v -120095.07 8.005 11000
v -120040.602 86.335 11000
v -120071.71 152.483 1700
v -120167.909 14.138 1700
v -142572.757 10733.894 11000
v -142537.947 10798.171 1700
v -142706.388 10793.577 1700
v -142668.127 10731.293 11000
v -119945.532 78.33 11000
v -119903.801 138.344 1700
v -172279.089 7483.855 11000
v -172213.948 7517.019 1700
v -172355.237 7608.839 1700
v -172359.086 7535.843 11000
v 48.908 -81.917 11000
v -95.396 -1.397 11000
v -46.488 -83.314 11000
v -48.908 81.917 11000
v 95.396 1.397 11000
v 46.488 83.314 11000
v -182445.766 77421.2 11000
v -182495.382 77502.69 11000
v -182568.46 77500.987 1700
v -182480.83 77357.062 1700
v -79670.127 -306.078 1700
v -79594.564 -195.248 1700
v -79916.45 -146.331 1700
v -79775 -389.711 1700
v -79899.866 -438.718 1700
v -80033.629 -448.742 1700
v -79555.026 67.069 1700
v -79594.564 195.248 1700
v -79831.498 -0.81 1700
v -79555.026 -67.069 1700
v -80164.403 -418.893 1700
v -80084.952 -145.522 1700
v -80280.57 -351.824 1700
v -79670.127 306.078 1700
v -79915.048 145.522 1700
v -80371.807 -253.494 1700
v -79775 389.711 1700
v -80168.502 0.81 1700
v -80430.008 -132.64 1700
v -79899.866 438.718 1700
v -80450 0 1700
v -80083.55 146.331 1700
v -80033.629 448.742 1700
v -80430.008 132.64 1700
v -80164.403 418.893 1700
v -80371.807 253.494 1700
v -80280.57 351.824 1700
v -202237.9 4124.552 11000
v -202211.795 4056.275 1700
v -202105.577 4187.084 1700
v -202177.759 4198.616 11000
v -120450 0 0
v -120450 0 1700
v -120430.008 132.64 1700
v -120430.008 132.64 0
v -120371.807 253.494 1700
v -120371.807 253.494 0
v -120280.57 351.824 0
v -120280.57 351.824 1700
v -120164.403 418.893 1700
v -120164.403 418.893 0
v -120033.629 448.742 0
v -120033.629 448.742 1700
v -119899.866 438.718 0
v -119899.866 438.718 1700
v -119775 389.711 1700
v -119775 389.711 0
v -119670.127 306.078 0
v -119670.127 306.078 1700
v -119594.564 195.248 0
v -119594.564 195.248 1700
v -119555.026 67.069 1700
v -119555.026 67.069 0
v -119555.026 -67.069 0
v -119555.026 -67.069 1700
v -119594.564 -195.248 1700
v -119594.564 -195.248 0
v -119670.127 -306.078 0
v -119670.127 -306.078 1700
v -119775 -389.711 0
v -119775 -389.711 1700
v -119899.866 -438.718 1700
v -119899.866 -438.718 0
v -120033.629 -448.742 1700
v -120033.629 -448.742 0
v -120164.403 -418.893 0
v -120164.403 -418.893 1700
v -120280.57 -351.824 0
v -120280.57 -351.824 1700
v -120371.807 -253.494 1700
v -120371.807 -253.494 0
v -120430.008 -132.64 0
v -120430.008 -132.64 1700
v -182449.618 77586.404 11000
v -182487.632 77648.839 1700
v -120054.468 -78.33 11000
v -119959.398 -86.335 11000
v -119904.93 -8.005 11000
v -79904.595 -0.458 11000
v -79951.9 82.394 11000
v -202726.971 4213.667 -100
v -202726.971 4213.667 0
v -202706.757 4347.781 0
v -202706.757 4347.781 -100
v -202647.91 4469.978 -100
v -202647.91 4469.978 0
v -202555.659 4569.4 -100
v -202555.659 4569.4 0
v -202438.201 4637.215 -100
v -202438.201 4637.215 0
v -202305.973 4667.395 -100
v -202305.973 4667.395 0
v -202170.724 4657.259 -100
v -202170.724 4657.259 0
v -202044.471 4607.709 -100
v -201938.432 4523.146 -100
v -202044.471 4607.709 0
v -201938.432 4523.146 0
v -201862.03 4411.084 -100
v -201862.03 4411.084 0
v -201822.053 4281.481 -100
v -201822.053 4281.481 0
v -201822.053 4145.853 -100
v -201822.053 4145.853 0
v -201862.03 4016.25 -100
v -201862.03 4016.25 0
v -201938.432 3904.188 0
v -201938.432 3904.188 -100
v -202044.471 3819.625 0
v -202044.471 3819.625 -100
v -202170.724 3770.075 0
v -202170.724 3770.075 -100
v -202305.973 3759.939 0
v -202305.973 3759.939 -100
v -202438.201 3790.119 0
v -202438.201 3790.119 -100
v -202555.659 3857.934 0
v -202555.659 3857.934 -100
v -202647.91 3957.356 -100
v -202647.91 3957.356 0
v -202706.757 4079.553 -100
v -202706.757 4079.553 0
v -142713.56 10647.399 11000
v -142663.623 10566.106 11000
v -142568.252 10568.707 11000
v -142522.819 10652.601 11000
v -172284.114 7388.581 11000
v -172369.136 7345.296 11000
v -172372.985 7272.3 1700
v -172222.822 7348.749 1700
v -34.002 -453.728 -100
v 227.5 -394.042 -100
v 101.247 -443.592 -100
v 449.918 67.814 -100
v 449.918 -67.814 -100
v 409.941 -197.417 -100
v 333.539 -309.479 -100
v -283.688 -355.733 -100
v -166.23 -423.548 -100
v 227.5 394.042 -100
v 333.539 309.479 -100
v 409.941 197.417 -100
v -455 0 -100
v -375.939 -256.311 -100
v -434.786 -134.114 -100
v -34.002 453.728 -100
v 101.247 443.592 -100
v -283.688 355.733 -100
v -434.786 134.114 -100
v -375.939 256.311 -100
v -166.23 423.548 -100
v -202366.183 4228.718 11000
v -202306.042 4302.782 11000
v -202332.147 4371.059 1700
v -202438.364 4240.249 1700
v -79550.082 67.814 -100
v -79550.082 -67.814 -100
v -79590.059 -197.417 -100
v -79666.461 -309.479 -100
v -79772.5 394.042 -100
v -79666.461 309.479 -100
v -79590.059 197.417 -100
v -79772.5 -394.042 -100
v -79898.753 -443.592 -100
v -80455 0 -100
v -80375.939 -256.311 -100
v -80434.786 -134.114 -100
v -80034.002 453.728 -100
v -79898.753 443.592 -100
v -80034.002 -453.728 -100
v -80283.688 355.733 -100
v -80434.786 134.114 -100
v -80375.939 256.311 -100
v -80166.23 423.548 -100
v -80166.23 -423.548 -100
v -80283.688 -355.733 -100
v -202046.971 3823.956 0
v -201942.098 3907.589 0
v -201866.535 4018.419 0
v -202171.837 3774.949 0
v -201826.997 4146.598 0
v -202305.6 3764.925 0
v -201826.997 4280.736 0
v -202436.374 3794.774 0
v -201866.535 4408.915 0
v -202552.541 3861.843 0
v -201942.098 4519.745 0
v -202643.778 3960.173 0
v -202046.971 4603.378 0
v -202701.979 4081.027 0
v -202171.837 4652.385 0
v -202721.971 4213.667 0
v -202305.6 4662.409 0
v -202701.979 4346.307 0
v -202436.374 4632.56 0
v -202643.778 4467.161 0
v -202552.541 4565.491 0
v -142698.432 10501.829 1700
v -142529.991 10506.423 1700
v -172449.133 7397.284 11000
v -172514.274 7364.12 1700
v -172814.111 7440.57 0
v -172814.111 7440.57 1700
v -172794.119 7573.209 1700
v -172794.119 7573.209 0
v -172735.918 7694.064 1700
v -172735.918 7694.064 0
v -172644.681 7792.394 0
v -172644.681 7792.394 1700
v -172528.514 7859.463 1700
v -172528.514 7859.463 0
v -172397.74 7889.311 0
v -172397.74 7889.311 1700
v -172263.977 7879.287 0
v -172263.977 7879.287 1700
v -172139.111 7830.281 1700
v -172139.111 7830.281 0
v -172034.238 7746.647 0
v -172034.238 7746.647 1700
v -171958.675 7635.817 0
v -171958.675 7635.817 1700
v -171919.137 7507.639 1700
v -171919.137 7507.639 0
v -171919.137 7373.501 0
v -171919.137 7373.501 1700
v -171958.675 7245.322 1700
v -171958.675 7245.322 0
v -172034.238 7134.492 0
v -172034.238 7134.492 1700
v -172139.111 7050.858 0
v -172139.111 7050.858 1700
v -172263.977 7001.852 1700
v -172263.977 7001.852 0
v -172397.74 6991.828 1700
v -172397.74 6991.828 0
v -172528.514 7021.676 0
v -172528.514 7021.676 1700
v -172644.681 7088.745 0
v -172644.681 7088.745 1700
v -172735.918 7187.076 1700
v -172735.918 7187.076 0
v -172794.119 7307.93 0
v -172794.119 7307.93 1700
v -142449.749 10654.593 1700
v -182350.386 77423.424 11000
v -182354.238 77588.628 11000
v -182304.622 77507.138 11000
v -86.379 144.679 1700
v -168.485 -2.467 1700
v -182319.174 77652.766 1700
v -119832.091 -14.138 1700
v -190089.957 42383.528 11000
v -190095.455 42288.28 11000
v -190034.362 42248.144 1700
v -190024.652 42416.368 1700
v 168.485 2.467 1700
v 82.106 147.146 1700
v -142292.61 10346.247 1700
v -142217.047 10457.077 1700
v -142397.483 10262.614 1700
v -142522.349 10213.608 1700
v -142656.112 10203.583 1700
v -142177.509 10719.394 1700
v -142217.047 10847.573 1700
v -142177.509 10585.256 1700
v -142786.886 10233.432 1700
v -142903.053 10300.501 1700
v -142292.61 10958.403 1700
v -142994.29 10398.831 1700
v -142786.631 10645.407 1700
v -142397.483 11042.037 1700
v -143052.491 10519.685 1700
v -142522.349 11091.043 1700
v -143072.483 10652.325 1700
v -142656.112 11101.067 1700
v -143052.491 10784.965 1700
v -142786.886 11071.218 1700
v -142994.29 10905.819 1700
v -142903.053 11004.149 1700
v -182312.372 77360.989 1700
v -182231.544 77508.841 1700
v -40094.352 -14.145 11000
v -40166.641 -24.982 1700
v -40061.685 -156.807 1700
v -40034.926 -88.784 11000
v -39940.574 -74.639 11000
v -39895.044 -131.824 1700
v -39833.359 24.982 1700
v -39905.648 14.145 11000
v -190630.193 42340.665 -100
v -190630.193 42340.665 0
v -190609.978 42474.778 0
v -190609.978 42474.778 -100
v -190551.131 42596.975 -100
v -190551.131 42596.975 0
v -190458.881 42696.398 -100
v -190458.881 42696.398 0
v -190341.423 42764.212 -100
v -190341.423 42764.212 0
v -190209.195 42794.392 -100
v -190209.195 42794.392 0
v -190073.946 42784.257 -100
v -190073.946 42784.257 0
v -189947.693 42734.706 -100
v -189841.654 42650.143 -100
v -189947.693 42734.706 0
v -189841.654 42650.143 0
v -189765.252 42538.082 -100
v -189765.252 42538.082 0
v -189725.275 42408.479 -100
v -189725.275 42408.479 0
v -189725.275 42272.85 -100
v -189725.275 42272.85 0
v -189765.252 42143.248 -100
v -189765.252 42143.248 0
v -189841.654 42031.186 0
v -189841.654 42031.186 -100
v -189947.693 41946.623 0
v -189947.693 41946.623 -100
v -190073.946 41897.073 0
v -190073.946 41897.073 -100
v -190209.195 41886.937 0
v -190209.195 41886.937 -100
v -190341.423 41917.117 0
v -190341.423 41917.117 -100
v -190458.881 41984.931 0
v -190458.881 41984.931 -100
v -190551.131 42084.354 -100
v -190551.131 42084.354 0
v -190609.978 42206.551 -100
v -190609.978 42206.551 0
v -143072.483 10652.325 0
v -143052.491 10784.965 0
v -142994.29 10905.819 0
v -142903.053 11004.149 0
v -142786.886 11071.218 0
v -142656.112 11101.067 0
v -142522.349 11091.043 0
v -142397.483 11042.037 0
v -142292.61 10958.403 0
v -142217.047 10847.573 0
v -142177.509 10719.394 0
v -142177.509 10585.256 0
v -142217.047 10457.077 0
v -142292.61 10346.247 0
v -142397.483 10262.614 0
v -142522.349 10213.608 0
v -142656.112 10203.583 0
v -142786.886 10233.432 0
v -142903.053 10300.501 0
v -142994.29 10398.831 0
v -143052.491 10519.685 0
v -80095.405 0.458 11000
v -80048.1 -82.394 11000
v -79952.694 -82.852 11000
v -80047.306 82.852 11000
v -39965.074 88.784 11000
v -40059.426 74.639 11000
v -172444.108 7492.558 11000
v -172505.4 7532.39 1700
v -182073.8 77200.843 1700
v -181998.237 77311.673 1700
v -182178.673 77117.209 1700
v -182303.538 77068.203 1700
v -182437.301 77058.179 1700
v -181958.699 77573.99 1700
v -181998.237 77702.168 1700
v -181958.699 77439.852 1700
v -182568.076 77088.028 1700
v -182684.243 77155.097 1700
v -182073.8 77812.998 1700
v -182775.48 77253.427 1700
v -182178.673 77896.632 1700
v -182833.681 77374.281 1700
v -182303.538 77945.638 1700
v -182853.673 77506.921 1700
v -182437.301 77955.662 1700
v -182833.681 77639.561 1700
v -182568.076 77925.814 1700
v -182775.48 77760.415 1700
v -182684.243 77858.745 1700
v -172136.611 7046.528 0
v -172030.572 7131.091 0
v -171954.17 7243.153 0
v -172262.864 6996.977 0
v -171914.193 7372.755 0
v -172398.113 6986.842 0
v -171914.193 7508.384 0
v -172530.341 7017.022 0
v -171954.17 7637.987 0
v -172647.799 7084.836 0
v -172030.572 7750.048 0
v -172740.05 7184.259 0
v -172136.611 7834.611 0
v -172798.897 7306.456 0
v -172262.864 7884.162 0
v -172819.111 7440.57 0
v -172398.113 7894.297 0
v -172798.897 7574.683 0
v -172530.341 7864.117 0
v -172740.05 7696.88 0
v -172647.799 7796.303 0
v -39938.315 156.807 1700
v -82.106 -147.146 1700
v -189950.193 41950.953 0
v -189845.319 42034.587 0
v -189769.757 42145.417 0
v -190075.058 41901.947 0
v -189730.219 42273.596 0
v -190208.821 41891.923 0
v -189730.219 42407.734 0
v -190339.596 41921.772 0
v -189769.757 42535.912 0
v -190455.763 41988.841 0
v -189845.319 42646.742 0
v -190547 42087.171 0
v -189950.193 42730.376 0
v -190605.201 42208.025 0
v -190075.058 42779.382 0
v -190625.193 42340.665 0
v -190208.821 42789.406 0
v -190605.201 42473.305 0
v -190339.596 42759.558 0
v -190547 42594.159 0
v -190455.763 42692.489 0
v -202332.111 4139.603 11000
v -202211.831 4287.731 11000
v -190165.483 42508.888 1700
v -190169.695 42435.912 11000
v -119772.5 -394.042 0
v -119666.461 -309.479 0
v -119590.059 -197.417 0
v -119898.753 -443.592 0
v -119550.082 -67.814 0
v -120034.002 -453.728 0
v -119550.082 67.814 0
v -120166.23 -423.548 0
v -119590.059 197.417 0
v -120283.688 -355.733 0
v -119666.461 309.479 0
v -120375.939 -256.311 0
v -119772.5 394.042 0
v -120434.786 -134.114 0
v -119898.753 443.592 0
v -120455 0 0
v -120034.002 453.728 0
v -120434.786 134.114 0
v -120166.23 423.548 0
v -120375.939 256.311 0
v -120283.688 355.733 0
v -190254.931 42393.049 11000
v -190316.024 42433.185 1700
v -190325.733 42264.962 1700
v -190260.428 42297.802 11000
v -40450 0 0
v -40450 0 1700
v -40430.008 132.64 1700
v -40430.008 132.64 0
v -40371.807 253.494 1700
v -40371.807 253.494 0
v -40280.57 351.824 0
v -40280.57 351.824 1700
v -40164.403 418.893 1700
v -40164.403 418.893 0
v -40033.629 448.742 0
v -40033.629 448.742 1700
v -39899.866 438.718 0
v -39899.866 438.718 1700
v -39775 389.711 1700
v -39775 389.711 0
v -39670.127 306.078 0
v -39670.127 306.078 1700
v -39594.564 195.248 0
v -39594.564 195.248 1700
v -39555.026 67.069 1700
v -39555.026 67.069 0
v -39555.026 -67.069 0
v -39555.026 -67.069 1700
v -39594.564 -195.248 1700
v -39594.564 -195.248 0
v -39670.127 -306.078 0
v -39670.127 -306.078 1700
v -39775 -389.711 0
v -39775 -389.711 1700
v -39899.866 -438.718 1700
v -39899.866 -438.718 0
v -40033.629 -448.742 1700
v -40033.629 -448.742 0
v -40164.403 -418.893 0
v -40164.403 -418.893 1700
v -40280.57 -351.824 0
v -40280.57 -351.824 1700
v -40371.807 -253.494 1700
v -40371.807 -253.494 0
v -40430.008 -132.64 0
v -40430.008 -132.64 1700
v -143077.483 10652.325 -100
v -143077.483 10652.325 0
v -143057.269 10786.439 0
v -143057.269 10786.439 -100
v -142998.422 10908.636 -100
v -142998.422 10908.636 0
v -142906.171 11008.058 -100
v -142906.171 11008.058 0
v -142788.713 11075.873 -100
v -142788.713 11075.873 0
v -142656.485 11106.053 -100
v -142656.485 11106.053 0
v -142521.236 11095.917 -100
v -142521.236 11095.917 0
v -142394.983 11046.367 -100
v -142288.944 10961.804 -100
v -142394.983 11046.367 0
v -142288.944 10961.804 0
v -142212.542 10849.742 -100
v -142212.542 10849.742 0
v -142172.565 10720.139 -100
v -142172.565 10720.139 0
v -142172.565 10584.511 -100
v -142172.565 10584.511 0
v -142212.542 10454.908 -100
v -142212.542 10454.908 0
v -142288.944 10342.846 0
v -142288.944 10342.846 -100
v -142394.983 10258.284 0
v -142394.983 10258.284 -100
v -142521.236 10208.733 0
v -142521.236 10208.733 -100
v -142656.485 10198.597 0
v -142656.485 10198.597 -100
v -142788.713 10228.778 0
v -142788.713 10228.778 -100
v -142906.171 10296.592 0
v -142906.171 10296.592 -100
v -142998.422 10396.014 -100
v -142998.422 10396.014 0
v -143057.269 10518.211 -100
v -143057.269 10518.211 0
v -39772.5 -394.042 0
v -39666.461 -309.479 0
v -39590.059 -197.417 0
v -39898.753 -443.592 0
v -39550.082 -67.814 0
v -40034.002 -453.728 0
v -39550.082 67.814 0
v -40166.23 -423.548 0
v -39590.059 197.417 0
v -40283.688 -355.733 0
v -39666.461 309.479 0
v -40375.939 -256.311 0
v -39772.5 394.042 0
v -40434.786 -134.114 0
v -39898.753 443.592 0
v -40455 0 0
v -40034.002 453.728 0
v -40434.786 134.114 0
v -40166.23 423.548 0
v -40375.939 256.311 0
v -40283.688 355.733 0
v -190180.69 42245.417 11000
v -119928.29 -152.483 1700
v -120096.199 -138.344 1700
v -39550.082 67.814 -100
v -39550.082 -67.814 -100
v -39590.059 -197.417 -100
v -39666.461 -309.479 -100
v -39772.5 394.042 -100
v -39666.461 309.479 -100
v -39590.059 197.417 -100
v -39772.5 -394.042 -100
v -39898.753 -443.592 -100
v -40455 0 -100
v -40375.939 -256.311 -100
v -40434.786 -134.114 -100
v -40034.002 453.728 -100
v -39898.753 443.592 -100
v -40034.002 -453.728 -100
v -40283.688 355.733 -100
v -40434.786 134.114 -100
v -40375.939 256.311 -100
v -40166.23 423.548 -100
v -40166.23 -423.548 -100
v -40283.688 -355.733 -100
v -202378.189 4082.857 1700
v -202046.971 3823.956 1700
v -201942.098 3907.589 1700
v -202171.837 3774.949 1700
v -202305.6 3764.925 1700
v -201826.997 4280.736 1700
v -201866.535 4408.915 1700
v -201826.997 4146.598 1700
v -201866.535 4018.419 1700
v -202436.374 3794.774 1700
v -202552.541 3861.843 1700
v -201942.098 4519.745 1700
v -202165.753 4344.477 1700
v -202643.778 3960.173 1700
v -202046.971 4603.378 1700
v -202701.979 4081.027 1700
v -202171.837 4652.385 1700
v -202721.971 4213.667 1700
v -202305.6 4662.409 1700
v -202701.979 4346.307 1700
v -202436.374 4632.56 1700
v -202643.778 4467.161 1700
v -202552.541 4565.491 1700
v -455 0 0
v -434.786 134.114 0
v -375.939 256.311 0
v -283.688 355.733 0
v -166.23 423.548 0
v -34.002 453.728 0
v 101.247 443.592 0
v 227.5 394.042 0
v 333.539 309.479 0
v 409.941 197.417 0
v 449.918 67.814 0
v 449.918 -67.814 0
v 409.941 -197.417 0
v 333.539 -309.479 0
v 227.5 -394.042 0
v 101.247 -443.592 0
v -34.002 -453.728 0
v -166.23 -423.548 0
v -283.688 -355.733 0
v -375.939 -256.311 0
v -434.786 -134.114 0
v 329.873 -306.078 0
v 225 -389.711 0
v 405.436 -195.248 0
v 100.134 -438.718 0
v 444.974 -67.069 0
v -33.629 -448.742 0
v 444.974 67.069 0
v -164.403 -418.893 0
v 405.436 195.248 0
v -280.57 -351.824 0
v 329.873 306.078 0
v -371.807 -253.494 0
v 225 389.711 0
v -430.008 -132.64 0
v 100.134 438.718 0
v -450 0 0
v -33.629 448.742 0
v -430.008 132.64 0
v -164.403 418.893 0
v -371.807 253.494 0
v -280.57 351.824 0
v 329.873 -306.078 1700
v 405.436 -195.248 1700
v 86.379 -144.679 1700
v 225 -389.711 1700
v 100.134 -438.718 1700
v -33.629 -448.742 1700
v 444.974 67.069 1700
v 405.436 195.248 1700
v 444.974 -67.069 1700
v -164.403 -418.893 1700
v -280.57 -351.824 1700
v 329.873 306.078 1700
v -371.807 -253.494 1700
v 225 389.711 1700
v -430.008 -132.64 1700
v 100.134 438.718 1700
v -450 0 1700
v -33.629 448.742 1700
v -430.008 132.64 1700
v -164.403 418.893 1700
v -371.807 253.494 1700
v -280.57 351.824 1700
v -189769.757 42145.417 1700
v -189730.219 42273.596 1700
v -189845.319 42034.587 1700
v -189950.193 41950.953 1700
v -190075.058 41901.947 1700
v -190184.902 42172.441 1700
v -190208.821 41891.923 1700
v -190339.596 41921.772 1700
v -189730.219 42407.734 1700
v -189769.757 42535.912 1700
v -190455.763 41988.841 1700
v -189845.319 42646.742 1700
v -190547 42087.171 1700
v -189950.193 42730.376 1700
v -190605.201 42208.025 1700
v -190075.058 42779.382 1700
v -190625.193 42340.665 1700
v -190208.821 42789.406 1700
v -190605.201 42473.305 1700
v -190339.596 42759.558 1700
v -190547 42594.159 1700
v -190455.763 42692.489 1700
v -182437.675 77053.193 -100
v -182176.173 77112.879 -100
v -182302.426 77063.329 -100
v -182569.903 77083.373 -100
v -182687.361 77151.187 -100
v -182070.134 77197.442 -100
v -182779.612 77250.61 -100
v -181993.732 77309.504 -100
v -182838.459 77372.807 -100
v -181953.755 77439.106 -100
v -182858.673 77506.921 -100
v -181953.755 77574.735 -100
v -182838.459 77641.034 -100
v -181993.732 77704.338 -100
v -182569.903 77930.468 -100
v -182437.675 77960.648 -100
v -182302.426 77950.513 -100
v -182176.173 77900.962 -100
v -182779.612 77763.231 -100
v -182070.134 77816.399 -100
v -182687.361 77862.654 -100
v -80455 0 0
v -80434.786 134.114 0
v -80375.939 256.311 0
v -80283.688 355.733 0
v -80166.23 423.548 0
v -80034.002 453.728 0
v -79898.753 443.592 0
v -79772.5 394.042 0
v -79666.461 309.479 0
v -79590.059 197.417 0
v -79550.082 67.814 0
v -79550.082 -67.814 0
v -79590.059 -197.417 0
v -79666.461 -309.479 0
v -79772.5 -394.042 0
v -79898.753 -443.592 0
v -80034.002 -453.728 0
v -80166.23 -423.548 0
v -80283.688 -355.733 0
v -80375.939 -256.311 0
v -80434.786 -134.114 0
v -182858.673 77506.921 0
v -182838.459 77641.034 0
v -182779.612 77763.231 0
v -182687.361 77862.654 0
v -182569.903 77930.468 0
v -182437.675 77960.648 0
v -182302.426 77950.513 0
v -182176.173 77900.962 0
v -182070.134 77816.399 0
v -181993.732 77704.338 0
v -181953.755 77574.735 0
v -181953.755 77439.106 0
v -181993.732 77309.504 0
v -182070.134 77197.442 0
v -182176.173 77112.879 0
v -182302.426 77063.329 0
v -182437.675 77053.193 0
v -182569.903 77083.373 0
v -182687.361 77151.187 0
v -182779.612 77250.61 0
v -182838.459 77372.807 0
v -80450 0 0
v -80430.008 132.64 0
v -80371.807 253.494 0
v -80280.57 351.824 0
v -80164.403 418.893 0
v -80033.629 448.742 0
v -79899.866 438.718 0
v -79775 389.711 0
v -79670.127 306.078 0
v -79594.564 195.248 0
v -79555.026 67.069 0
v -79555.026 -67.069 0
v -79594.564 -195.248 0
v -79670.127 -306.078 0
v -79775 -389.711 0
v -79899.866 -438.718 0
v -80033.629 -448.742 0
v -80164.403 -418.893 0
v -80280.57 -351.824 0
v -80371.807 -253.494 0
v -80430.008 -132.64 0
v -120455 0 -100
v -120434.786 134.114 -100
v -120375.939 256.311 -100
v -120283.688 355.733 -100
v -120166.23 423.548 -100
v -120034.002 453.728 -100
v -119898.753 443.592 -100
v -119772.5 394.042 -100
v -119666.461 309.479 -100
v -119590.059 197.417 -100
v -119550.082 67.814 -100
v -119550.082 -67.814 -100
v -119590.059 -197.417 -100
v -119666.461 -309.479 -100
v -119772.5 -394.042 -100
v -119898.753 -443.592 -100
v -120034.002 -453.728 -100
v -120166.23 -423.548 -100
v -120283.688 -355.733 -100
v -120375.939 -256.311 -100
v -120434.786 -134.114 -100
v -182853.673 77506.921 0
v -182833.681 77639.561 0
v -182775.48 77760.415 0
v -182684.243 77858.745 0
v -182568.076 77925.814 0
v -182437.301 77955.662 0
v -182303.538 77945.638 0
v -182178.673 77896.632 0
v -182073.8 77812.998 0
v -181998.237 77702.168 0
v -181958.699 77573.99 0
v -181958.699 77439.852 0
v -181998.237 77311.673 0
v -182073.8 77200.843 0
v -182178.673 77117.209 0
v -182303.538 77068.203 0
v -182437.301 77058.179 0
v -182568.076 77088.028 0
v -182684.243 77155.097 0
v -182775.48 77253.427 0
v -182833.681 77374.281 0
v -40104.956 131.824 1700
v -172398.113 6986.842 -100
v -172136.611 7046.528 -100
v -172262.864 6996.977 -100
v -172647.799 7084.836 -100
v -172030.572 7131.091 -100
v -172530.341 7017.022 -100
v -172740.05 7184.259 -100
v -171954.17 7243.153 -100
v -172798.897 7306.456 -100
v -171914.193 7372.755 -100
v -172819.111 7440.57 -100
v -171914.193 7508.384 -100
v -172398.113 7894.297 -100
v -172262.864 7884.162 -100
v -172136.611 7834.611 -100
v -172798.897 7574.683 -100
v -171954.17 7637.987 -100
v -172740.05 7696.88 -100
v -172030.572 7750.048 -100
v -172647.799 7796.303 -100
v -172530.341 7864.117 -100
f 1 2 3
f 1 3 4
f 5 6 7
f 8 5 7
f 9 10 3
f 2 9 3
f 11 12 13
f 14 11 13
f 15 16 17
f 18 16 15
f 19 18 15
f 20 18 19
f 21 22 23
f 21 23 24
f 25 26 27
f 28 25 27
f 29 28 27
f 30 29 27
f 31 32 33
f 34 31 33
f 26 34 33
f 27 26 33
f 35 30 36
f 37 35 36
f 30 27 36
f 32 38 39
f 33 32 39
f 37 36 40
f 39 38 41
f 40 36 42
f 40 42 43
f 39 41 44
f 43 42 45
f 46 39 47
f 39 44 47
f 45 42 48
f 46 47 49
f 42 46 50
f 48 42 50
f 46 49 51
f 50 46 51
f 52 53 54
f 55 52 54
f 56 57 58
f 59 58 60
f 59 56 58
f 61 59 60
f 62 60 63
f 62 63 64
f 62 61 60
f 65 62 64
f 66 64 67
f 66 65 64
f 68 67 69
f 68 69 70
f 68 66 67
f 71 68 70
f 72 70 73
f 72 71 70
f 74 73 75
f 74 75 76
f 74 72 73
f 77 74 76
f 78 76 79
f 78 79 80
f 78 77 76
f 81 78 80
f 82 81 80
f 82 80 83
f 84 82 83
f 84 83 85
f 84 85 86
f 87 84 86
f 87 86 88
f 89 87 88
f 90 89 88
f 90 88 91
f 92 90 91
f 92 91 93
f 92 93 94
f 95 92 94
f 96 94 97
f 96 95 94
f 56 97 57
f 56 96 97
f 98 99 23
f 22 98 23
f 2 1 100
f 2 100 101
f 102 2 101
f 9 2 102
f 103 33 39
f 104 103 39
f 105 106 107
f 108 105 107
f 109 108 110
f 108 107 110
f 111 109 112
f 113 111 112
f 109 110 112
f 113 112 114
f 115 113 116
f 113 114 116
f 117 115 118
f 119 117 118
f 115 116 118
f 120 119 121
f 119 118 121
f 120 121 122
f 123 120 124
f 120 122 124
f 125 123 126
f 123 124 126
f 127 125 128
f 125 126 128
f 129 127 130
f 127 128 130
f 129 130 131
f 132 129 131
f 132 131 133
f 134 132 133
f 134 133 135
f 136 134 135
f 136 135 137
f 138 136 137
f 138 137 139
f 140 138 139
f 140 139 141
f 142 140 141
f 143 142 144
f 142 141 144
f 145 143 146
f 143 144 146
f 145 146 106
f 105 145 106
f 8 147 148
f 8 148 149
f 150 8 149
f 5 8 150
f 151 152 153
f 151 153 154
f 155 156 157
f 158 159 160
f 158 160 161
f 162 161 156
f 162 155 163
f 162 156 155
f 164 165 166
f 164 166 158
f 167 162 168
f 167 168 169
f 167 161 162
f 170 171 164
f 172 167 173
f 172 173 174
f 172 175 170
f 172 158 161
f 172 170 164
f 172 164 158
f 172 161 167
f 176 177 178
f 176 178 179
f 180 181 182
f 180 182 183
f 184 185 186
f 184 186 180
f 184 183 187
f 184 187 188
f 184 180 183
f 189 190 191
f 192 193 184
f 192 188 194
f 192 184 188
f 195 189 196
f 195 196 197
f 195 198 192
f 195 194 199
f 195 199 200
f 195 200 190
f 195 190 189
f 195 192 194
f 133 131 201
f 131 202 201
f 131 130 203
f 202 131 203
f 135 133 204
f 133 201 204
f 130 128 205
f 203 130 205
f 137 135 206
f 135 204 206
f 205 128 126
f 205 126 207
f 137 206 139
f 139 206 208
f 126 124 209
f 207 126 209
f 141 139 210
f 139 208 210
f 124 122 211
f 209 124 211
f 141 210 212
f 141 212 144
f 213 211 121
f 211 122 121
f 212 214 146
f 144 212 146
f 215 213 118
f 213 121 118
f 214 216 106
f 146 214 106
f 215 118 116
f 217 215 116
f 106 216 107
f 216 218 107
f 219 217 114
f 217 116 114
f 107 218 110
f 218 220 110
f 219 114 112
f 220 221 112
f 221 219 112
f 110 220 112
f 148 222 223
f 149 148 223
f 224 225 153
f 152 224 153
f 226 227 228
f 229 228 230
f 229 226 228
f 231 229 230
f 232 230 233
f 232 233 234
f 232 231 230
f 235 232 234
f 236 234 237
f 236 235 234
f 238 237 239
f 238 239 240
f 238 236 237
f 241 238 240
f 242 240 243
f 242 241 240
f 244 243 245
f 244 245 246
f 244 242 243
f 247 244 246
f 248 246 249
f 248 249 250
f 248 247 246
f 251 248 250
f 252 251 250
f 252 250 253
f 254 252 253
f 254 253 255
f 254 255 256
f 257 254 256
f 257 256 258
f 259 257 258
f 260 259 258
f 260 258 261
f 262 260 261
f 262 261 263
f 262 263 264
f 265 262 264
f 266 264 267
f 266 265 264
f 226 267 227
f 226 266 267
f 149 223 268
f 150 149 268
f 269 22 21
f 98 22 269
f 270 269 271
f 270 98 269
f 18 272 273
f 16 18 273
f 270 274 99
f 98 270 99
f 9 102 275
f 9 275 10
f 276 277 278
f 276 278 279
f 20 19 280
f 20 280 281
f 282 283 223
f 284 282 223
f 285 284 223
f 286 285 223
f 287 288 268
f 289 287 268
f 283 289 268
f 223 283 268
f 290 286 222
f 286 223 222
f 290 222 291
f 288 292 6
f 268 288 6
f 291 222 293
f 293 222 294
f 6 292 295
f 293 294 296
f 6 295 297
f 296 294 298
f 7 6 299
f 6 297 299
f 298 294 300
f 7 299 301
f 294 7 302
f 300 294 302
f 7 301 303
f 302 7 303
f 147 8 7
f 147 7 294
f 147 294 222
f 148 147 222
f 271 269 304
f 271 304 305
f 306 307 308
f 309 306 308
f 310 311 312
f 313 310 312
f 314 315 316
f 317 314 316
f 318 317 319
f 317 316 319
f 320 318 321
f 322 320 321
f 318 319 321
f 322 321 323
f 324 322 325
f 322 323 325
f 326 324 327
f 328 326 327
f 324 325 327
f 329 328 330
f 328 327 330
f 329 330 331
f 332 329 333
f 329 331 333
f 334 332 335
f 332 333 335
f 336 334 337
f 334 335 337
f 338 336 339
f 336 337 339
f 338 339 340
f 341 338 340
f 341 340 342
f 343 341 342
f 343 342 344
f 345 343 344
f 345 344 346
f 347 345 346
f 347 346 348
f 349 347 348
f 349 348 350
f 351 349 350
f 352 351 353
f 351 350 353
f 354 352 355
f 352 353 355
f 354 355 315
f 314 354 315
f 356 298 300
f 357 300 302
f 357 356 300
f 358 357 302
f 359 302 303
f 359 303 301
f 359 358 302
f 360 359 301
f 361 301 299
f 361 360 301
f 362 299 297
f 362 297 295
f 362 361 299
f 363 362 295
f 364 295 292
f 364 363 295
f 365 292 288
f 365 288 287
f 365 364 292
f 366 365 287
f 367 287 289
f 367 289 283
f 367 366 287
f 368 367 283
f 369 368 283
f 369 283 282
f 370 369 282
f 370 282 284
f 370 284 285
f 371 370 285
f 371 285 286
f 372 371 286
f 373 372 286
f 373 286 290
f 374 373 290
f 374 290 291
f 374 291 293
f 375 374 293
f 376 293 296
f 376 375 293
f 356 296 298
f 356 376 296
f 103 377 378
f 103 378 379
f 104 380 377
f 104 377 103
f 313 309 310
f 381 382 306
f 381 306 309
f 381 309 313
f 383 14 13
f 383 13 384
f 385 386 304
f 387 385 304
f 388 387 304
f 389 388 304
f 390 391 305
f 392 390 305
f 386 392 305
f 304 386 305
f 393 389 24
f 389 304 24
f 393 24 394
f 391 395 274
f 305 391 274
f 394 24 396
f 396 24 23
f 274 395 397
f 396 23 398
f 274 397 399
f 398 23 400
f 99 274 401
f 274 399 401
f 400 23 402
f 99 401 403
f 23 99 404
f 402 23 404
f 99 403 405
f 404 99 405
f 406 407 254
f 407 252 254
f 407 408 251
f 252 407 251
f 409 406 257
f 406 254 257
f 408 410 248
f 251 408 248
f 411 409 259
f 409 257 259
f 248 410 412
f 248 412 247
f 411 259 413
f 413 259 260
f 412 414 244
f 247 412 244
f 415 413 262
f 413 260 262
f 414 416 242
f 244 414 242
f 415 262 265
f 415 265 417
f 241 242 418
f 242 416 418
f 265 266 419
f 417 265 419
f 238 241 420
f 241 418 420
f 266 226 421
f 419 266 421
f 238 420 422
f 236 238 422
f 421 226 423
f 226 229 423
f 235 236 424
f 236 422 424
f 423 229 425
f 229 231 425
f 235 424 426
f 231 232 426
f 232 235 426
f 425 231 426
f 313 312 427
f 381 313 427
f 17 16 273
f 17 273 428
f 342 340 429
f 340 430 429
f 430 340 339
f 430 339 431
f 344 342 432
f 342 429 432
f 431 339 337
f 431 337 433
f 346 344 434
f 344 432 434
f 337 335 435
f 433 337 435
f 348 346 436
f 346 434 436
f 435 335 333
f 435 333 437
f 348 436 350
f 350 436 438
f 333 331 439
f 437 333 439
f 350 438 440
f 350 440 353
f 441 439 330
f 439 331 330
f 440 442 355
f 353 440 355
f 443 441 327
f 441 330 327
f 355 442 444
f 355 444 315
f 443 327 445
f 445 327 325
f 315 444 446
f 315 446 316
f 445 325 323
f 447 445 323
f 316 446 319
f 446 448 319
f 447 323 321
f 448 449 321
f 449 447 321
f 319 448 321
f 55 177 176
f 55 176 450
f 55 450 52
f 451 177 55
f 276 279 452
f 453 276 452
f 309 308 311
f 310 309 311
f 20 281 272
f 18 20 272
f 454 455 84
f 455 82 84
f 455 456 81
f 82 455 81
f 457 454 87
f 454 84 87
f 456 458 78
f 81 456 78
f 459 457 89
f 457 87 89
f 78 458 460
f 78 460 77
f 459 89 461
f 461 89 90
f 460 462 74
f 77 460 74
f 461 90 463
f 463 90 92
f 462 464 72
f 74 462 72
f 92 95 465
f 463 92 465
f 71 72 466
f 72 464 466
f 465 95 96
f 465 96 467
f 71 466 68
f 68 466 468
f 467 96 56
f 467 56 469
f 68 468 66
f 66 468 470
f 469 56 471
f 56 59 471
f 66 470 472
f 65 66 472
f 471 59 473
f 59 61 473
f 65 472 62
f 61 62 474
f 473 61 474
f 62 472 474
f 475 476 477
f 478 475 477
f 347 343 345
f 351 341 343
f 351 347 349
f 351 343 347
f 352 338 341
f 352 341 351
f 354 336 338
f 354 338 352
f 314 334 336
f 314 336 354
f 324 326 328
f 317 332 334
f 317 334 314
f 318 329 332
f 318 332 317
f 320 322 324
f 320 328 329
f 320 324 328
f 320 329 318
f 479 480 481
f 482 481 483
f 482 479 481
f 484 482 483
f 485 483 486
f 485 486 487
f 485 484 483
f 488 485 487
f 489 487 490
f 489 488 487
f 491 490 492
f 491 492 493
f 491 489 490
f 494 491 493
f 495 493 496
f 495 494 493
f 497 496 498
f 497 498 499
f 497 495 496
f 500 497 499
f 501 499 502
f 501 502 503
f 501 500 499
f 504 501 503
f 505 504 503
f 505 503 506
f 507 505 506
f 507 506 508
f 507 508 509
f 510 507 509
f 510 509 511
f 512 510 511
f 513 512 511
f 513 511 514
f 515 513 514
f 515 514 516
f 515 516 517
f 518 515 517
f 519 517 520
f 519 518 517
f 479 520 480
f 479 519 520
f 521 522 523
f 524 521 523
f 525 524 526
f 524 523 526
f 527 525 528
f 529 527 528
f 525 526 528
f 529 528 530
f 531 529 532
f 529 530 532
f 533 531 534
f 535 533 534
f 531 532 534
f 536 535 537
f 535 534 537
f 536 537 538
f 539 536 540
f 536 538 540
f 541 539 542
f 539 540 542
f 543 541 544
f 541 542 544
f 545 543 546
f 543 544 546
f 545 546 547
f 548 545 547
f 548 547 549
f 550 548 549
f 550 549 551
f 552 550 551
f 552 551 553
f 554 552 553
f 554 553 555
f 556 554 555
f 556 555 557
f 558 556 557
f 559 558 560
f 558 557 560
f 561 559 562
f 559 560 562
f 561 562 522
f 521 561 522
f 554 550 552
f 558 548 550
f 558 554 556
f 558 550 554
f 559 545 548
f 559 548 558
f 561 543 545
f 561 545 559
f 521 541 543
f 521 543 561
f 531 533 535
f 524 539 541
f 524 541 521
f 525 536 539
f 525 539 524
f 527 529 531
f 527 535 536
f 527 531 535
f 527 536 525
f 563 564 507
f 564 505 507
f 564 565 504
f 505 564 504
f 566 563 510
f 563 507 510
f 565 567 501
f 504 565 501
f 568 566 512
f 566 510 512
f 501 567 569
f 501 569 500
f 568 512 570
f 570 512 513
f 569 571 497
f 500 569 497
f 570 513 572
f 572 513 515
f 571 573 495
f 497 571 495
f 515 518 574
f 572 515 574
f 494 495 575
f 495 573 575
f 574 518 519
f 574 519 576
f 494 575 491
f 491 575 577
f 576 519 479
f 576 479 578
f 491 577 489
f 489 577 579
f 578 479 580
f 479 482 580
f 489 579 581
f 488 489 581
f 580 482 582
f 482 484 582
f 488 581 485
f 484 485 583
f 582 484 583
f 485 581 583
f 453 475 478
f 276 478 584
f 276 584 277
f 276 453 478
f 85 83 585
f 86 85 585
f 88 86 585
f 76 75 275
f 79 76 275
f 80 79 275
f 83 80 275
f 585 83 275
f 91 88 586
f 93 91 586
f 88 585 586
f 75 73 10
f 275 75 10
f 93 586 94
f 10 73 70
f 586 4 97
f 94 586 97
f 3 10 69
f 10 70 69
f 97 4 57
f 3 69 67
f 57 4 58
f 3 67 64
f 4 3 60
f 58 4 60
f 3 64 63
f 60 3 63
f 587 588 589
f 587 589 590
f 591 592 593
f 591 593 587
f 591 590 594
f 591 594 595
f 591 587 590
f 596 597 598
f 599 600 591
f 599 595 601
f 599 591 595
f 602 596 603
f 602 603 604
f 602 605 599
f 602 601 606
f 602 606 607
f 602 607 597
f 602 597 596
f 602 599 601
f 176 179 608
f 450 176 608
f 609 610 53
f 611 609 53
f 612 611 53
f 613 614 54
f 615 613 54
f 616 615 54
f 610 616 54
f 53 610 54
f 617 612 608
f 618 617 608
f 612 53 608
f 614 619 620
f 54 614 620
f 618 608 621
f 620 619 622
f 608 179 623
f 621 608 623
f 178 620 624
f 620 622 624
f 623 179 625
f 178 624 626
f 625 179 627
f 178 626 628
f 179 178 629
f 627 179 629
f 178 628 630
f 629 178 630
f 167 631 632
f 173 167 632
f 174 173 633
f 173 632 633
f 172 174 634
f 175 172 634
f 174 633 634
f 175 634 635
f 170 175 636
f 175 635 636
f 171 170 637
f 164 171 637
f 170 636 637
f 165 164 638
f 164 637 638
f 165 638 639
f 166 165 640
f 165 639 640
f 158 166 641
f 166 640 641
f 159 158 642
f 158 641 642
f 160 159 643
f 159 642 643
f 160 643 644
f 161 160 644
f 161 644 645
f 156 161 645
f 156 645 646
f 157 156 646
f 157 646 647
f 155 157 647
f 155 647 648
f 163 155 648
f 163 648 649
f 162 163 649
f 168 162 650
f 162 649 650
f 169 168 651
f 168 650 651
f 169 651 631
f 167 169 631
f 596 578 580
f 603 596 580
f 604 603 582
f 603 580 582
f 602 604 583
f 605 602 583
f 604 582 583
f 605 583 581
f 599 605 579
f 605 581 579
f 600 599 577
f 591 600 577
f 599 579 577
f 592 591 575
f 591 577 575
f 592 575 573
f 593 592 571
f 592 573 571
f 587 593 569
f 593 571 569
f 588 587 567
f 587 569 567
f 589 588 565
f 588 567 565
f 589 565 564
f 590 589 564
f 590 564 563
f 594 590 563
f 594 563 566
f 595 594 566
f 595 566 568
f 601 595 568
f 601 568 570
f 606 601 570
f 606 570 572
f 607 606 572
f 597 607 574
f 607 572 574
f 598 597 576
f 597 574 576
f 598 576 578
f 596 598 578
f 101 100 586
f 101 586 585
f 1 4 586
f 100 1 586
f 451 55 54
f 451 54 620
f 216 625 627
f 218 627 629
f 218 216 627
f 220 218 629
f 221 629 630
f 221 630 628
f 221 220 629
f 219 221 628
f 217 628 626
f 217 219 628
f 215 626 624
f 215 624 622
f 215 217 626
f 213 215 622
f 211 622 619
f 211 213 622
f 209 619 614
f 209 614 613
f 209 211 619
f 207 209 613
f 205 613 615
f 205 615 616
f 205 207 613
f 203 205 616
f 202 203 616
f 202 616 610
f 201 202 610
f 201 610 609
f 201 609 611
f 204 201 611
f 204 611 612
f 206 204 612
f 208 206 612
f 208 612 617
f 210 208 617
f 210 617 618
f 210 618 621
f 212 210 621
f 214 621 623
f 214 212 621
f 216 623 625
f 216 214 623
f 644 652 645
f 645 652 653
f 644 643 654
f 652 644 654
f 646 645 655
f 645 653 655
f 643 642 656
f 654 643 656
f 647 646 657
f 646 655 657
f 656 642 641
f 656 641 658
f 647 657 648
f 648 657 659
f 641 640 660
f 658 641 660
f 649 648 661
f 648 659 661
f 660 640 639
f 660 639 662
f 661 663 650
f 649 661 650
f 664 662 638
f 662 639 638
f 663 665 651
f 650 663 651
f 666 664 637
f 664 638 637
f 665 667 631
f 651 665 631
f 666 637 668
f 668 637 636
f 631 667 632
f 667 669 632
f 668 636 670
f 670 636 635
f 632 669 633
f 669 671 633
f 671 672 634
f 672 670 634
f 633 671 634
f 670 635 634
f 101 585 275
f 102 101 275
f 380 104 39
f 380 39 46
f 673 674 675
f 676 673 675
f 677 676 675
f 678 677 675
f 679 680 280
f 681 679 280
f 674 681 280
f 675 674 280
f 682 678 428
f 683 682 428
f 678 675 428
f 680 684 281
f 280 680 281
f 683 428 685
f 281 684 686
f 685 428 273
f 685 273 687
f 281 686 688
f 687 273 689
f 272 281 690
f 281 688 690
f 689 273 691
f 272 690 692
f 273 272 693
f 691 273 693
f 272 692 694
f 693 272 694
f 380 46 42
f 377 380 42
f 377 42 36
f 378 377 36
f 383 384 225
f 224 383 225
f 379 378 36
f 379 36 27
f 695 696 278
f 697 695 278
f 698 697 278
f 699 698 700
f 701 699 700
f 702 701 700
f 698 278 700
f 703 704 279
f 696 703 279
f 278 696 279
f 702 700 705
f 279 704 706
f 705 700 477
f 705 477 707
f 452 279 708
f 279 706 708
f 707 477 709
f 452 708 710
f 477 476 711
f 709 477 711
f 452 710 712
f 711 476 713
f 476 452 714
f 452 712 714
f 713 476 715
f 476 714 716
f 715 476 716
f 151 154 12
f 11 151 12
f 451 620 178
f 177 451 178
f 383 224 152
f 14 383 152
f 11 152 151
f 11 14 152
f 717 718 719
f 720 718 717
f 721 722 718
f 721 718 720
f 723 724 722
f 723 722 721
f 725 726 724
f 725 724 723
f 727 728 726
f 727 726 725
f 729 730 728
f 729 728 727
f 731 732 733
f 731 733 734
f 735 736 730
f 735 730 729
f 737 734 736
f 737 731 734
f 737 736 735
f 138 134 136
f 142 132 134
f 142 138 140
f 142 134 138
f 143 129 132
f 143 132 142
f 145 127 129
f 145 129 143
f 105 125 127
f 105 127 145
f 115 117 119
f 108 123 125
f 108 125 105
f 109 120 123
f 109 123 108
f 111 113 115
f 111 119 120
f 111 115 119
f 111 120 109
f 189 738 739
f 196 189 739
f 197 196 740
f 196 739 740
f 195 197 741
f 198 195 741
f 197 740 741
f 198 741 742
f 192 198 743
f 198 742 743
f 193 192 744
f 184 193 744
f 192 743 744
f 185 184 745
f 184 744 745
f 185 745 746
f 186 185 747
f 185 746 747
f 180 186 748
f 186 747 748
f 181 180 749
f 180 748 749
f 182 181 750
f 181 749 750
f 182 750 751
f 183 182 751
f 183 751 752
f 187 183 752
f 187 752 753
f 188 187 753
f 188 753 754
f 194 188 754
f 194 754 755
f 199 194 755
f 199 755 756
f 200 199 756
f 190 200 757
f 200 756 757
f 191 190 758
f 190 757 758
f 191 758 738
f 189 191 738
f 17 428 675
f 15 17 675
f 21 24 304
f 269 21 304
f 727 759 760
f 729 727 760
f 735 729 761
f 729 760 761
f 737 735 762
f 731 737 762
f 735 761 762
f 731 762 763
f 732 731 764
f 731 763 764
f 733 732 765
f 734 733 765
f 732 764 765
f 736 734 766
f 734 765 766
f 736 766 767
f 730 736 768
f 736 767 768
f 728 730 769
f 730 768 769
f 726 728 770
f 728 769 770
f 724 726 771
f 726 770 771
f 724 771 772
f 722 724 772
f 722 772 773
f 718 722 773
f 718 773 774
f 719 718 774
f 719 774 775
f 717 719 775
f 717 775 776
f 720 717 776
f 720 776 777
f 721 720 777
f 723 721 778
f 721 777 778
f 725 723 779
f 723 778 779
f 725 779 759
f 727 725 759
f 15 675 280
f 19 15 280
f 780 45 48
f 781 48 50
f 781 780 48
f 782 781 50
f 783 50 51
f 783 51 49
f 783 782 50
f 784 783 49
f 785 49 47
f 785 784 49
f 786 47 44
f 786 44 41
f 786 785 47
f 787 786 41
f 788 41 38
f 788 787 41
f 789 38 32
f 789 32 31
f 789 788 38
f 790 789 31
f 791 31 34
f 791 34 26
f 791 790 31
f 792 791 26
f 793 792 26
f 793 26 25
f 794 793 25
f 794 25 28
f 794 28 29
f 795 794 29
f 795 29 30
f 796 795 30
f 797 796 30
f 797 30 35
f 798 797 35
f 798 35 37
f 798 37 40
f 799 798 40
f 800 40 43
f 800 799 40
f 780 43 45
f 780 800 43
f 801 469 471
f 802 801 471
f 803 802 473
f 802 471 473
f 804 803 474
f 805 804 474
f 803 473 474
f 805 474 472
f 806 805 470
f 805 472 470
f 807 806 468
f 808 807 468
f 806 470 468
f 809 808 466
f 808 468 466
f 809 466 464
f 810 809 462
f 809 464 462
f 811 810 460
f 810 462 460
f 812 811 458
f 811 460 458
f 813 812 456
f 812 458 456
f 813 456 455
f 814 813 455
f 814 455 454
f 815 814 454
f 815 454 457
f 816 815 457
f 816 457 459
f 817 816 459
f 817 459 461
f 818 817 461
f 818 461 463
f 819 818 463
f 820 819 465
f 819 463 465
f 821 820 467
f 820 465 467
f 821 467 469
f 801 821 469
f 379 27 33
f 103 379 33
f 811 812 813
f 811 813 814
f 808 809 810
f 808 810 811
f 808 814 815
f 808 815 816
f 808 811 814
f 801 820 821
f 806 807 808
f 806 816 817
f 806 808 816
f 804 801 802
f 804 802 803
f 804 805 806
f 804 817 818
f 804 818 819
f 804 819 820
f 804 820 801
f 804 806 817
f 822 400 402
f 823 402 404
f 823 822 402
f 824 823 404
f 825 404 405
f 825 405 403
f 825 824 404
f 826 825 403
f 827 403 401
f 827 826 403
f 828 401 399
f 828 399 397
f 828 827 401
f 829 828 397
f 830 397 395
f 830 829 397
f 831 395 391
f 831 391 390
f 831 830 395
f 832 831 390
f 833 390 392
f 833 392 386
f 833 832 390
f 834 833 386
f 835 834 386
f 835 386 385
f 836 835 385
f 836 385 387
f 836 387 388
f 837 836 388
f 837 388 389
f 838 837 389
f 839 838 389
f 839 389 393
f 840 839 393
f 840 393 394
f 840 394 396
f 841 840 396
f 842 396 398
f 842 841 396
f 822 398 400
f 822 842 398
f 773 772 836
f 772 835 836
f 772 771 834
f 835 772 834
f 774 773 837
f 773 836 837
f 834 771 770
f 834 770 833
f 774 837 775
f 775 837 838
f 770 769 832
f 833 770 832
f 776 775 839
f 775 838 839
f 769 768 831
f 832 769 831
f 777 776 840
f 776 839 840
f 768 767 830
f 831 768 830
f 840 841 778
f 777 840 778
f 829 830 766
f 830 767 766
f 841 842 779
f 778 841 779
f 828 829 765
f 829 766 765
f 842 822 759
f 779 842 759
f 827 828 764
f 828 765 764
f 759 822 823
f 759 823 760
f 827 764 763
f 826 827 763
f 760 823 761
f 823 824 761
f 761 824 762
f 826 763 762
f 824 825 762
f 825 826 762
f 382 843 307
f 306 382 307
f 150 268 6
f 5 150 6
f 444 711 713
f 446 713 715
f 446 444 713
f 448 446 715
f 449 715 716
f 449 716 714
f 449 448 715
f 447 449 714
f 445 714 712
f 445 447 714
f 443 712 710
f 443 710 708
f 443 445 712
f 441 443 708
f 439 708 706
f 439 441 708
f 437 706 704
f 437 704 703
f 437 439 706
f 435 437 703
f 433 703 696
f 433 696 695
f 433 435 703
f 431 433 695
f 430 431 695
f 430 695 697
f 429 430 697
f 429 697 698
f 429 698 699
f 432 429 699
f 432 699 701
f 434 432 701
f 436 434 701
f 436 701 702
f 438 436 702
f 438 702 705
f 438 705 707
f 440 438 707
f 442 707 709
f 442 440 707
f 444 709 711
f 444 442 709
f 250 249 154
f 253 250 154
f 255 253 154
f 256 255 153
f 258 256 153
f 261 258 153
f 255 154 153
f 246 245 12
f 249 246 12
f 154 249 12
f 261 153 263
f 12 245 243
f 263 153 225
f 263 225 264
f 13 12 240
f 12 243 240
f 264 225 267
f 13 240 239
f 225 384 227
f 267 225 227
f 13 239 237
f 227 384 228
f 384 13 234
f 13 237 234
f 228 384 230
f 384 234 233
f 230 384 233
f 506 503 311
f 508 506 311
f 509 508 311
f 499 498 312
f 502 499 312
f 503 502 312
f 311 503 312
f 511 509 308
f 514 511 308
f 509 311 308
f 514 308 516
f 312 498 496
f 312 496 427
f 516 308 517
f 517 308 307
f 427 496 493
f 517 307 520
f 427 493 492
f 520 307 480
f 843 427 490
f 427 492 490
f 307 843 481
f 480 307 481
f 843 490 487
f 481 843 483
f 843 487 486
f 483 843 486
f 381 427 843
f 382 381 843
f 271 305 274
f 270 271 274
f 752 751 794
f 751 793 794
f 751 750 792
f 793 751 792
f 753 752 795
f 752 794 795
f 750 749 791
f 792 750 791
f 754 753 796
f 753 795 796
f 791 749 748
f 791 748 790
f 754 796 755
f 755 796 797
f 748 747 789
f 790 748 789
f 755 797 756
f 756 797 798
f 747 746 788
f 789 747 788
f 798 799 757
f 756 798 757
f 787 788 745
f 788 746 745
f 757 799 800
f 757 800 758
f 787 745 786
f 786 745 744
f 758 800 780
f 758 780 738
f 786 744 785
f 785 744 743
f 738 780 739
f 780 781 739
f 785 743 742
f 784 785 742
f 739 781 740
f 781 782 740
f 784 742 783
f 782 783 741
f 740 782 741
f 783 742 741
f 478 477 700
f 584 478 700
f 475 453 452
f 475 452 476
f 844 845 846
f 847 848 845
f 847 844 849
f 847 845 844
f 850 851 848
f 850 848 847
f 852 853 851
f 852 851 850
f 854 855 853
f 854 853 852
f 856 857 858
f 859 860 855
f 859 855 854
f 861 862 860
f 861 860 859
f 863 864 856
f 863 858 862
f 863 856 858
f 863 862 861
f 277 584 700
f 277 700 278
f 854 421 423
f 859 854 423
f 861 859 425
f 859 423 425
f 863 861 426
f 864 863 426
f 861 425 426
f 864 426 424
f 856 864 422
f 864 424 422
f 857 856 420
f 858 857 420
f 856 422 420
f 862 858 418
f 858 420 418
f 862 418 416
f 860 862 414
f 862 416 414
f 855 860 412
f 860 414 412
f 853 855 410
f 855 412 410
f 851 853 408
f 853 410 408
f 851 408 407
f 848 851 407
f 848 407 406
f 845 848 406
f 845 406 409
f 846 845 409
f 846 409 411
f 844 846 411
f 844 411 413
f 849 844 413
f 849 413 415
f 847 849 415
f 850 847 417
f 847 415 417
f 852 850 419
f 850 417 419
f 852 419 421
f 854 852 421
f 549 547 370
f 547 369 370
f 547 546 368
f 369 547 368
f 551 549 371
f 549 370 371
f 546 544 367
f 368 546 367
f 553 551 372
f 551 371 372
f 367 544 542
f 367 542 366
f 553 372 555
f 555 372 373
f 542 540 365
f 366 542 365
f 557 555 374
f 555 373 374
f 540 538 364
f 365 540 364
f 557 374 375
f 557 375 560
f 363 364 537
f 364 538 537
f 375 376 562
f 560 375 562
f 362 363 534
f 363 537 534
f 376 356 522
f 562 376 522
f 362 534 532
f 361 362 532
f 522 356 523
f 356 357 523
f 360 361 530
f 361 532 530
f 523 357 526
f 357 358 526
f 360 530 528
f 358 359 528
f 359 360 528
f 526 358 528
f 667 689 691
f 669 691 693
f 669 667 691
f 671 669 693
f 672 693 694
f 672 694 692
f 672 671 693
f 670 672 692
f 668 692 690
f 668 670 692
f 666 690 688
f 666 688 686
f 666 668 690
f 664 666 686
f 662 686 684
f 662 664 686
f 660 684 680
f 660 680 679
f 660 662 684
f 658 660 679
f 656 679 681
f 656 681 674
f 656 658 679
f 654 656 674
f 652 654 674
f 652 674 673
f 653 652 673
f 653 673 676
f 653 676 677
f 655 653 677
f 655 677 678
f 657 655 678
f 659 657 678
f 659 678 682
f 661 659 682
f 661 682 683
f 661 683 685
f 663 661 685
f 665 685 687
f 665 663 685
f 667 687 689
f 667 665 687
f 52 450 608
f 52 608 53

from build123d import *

# Parameters (mm, degrees)
SALIENTE_EXTRUIR1_DEPTH           = 11000
SALIENTE_EXTRUIR1_DRAFT           = 0.39
SALIENTE_EXTRUIR1_PROFILE_2_DEPTH = 11000
SALIENTE_EXTRUIR1_PROFILE_2_DRAFT = 0.39
SALIENTE_EXTRUIR1_PROFILE_3_DEPTH = 11000
SALIENTE_EXTRUIR1_PROFILE_3_DRAFT = 0.39
SALIENTE_EXTRUIR1_PROFILE_4_DEPTH = 11000
SALIENTE_EXTRUIR1_PROFILE_4_DRAFT = 0.39
SALIENTE_EXTRUIR1_PROFILE_5_DEPTH = 11000
SALIENTE_EXTRUIR1_PROFILE_5_DRAFT = 0.39
SALIENTE_EXTRUIR1_PROFILE_6_DEPTH = 11000
SALIENTE_EXTRUIR1_PROFILE_6_DRAFT = 0.39
SALIENTE_EXTRUIR1_PROFILE_7_DEPTH = 11000
SALIENTE_EXTRUIR1_PROFILE_7_DRAFT = 0.39
SALIENTE_EXTRUIR1_PROFILE_8_DEPTH = 11000
SALIENTE_EXTRUIR1_PROFILE_8_DRAFT = 0.39
SALIENTE_EXTRUIR1_PROFILE_9_DEPTH = 11000
SALIENTE_EXTRUIR1_PROFILE_9_DRAFT = 0.39
CROQUIS9_R                        = 450
SALIENTE_EXTRUIR8_DEPTH           = 1700
CROQUIS10_R                       = 455
SALIENTE_EXTRUIR9_DEPTH           = 100
CROQUIS11_R                       = 574.012374022
CORTAR_EXTRUIR1_DEPTH             = 3000
CROQUIS12_R                       = 450
SALIENTE_EXTRUIR10_DEPTH          = 1700
CROQUIS13_R                       = 455
SALIENTE_EXTRUIR11_DEPTH          = 100


with BuildPart() as part:
    # Croquis1 → Saliente-Extruir1 (with draft: the straight prism first)
    with BuildSketch(Plane.XY):
        Polygon((88.617038428, 158.814421575), (-93.228804357, 156.151817274), (-181.845842785, -2.662604301), (-88.617038428, -158.814421575), (93.228804357, -156.151817274), (181.845842785, 2.662604301), align=None)
    extrude(amount=SALIENTE_EXTRUIR1_DEPTH)
    # Saliente-Extruir1: the draft: its side faces are tilted about the plane it starts from
    saliente_extruir1_sides = [part.faces().sort_by_distance(p)[0] for p in [
        (-2.305882965, 157.483119425, 5500),
        (-137.537323571, 76.744606487, 5500),
        (-135.231440607, -80.738512938, 5500),
        (2.305882965, -157.483119425, 5500),
        (137.537323571, -76.744606487, 5500),
        (135.231440607, 80.738512938, 5500),
    ]]
    draft(saliente_extruir1_sides, Plane.XY, SALIENTE_EXTRUIR1_DRAFT)



with BuildPart() as body_2:
    # Croquis1 → Saliente-Extruir1 profile 2 (with draft: the straight prism first)
    with BuildSketch(Plane.XY):
        Polygon((-39933.423158214, 169.241023803), (-40113.278605083, 142.277748192), (-40179.855446869, -26.963275611), (-40066.576841786, -169.241023803), (-39886.721394917, -142.277748192), (-39820.144553131, 26.963275611), align=None)
    extrude(amount=SALIENTE_EXTRUIR1_PROFILE_2_DEPTH)
    # Saliente-Extruir1 profile 2: the draft: its side faces are tilted about the plane it starts from
    saliente_extruir1_profile_2_sides = [body_2.faces().sort_by_distance(p)[0] for p in [
        (-40023.350881648, 155.759385997, 5500),
        (-40146.567025976, 57.65723629, 5500),
        (-40123.216144327, -98.102149707, 5500),
        (-39976.649118352, -155.759385997, 5500),
        (-39853.432974024, -57.65723629, 5500),
        (-39876.783855673, 98.102149707, 5500),
    ]]
    draft(saliente_extruir1_profile_2_sides, Plane.XY, SALIENTE_EXTRUIR1_PROFILE_2_DRAFT)


with BuildPart() as body_3:
    # Croquis1 → Saliente-Extruir1 profile 3 (with draft: the straight prism first)
    with BuildSketch(Plane.XY):
        Polygon((-182312.764922916, 77664.490519876), (-182494.580854337, 77660.251760415), (-182581.817946673, 77500.675165262), (-182487.239107589, 77345.337329569), (-182305.423176169, 77349.576089031), (-182218.186083832, 77509.152684184), align=None)
    extrude(amount=SALIENTE_EXTRUIR1_PROFILE_3_DEPTH)
    # Saliente-Extruir1 profile 3: the draft: its side faces are tilted about the plane it starts from
    saliente_extruir1_profile_3_sides = [body_3.faces().sort_by_distance(p)[0] for p in [
        (-182403.672888627, 77662.371140145, 5500),
        (-182538.199400505, 77580.463462838, 5500),
        (-182534.528527131, 77423.006247416, 5500),
        (-182396.331141879, 77347.4567093, 5500),
        (-182261.80463, 77429.364386607, 5500),
        (-182265.475503374, 77586.82160203, 5500),
    ]]
    draft(saliente_extruir1_profile_3_sides, Plane.XY, SALIENTE_EXTRUIR1_PROFILE_3_DRAFT)

    # Croquis12 → Saliente-Extruir10 (add)
    with BuildSketch(Plane(origin=(0, 0, 0), x_dir=(-1, 0, 0), z_dir=(0, 0, -1))):
        with Locations((182403.672888627, 77506.920712242)):
            Circle(CROQUIS12_R)
    extrude(amount=-SALIENTE_EXTRUIR10_DEPTH)

    # Croquis13 → Saliente-Extruir11 (add)
    with BuildSketch(Plane(origin=(0, 0, 0), x_dir=(-1, 0, 0), z_dir=(0, 0, -1))):
        with Locations((182403.672888627, 77506.920712242)):
            Circle(CROQUIS13_R)
    extrude(amount=SALIENTE_EXTRUIR11_DEPTH)


with BuildPart() as body_4:
    # Croquis1 → Saliente-Extruir1 profile 4 (with draft: the straight prism first)
    with BuildSketch(Plane.XY):
        Polygon((-79908.3116981, 157.061310623), (-80090.174934002, 157.935053987), (-80181.863235901, 0.873743363), (-80091.6883019, -157.061310623), (-79909.825065998, -157.935053987), (-79818.136764099, -0.873743363), align=None)
    extrude(amount=SALIENTE_EXTRUIR1_PROFILE_4_DEPTH)
    # Saliente-Extruir1 profile 4: the draft: its side faces are tilted about the plane it starts from
    saliente_extruir1_profile_4_sides = [body_4.faces().sort_by_distance(p)[0] for p in [
        (-79999.243316051, 157.498182305, 5500),
        (-80136.019084952, 79.404398675, 5500),
        (-80136.775768901, -78.09378363, 5500),
        (-80000.756683949, -157.498182305, 5500),
        (-79863.980915048, -79.404398675, 5500),
        (-79863.224231099, 78.09378363, 5500),
    ]]
    draft(saliente_extruir1_profile_4_sides, Plane.XY, SALIENTE_EXTRUIR1_PROFILE_4_DRAFT)


with BuildPart() as body_5:
    # Croquis1 → Saliente-Extruir1 profile 5 (with draft: the straight prism first)
    with BuildSketch(Plane.XY):
        Polygon((-119896.172838657, 149.314837064), (-120077.396861388, 164.574377857), (-120181.224022731, 15.259540793), (-120103.827161343, -149.314837064), (-119922.603138612, -164.574377858), (-119818.775977269, -15.259540793), align=None)
    extrude(amount=SALIENTE_EXTRUIR1_PROFILE_5_DEPTH)
    # Saliente-Extruir1 profile 5: the draft: its side faces are tilted about the plane it starts from
    saliente_extruir1_profile_5_sides = [body_5.faces().sort_by_distance(p)[0] for p in [
        (-119986.784850023, 156.944607461, 5500),
        (-120129.31044206, 89.916959325, 5500),
        (-120142.525592037, -67.027648136, 5500),
        (-120013.215149977, -156.944607461, 5500),
        (-119870.68955794, -89.916959325, 5500),
        (-119857.474407963, 67.027648135, 5500),
    ]]
    draft(saliente_extruir1_profile_5_sides, Plane.XY, SALIENTE_EXTRUIR1_PROFILE_5_DRAFT)


with BuildPart() as body_6:
    # Croquis1 → Saliente-Extruir1 profile 6 (with draft: the straight prism first)
    with BuildSketch(Plane.XY):
        Polygon((-142531.584159759, 10809.920223672), (-142713.38191326, 10804.962722093), (-142799.987467705, 10645.042498421), (-142704.795268648, 10490.079776328), (-142522.997515147, 10495.037277906), (-142436.391960702, 10654.957501579), align=None)
    extrude(amount=SALIENTE_EXTRUIR1_PROFILE_6_DEPTH)
    # Saliente-Extruir1 profile 6: the draft: its side faces are tilted about the plane it starts from
    saliente_extruir1_profile_6_sides = [body_6.faces().sort_by_distance(p)[0] for p in [
        (-142622.48303651, 10807.441472883, 5500),
        (-142756.684690483, 10725.002610257, 5500),
        (-142752.391368176, 10567.561137374, 5500),
        (-142613.896391897, 10492.558527117, 5500),
        (-142479.694737925, 10574.997389742, 5500),
        (-142483.988060231, 10732.438862625, 5500),
    ]]
    draft(saliente_extruir1_profile_6_sides, Plane.XY, SALIENTE_EXTRUIR1_PROFILE_6_DRAFT)


with BuildPart() as body_7:
    # Croquis1 → Saliente-Extruir1 profile 7 (with draft: the straight prism first)
    with BuildSketch(Plane.XY):
        Polygon((-190012.71485084, 42422.370948195), (-190164.71350507, 42522.22789143), (-190327.191481771, 42440.521667144), (-190337.670804241, 42258.958499622), (-190185.672150011, 42159.101556387), (-190023.194173311, 42240.807780673), align=None)
    extrude(amount=SALIENTE_EXTRUIR1_PROFILE_7_DEPTH)
    # Saliente-Extruir1 profile 7: the draft: its side faces are tilted about the plane it starts from
    saliente_extruir1_profile_7_sides = [body_7.faces().sort_by_distance(p)[0] for p in [
        (-190088.714177955, 42472.299419813, 5500),
        (-190245.95249342, 42481.374779287, 5500),
        (-190332.431143006, 42349.740083383, 5500),
        (-190261.671477126, 42209.030028004, 5500),
        (-190104.433161661, 42199.95466853, 5500),
        (-190017.954512075, 42331.589364434, 5500),
    ]]
    draft(saliente_extruir1_profile_7_sides, Plane.XY, SALIENTE_EXTRUIR1_PROFILE_7_DRAFT)


with BuildPart() as body_8:
    # Croquis1 → Saliente-Extruir1 profile 8 (with draft: the straight prism first)
    with BuildSketch(Plane.XY):
        Polygon((-172211.618628127, 7341.468309254), (-172202.04053876, 7523.081249884), (-172354.532914317, 7622.18258891), (-172516.603379242, 7539.670987307), (-172526.181468609, 7358.058046678), (-172373.689093052, 7258.956707652), align=None)
    extrude(amount=SALIENTE_EXTRUIR1_PROFILE_8_DEPTH)
    # Saliente-Extruir1 profile 8: the draft: its side faces are tilted about the plane it starts from
    saliente_extruir1_profile_8_sides = [body_8.faces().sort_by_distance(p)[0] for p in [
        (-172206.829583443, 7432.274779569, 5500),
        (-172278.286726538, 7572.631919397, 5500),
        (-172435.568146779, 7580.926788109, 5500),
        (-172521.392423925, 7448.864516993, 5500),
        (-172449.93528083, 7308.507377165, 5500),
        (-172292.653860589, 7300.212508453, 5500),
    ]]
    draft(saliente_extruir1_profile_8_sides, Plane.XY, SALIENTE_EXTRUIR1_PROFILE_8_DRAFT)


with BuildPart() as body_9:
    # Croquis1 → Saliente-Extruir1 profile 9 (with draft: the straight prism first)
    with BuildSketch(Plane.XY):
        Polygon((-202157.330322157, 4354.849547188), (-202336.918351888, 4383.539956337), (-202451.558989922, 4242.357364948), (-202386.611598224, 4072.484364411), (-202207.023568493, 4043.793955261), (-202092.38293046, 4184.97654665), align=None)
    extrude(amount=SALIENTE_EXTRUIR1_PROFILE_9_DEPTH)
    # Saliente-Extruir1 profile 9: the draft: its side faces are tilted about the plane it starts from
    saliente_extruir1_profile_9_sides = [body_9.faces().sort_by_distance(p)[0] for p in [
        (-202247.124337023, 4369.194751762, 5500),
        (-202394.238670905, 4312.948660642, 5500),
        (-202419.085294073, 4157.420864679, 5500),
        (-202296.817583359, 4058.139159836, 5500),
        (-202149.703249477, 4114.385250956, 5500),
        (-202124.856626308, 4269.913046919, 5500),
    ]]
    draft(saliente_extruir1_profile_9_sides, Plane.XY, SALIENTE_EXTRUIR1_PROFILE_9_DRAFT)


with BuildPart() as part_1:
    add(part.part)

    add(body_2.part)  # Saliente-Extruir8 merges body 2

    add(body_4.part)  # Saliente-Extruir8 merges body 4

    add(body_5.part)  # Saliente-Extruir8 merges body 5

    add(body_6.part)  # Saliente-Extruir8 merges body 6

    add(body_7.part)  # Saliente-Extruir8 merges body 7

    add(body_8.part)  # Saliente-Extruir8 merges body 8

    add(body_9.part)  # Saliente-Extruir8 merges body 9
    # Croquis9 → Saliente-Extruir8 (add)
    with BuildSketch(Plane(origin=(0, 0, 0), x_dir=(-1, 0, 0), z_dir=(0, 0, -1))):
        Circle(CROQUIS9_R)
        with Locations((40000, 0)):
            Circle(CROQUIS9_R)
        with Locations((80000, 0)):
            Circle(CROQUIS9_R)
        with Locations((120000, 0)):
            Circle(CROQUIS9_R)
        with Locations((142622.48303651, 10652.325069026)):
            Circle(CROQUIS9_R)
        with Locations((172364.111003684, 7440.569648281)):
            Circle(CROQUIS9_R)
        with Locations((202271.970960191, 4213.666955799)):
            Circle(CROQUIS9_R)
        with Locations((190175.192827541, 42340.664723909)):
            Circle(CROQUIS9_R)
        with Locations((185900.002015253, 77404.913924723)):
            Circle(CROQUIS9_R)
    extrude(amount=-SALIENTE_EXTRUIR8_DEPTH)

    # Croquis10 → Saliente-Extruir9 (add)
    with BuildSketch(Plane(origin=(0, 0, 0), x_dir=(-1, 0, 0), z_dir=(0, 0, -1))):
        Circle(CROQUIS10_R)
        with Locations((40000, 0)):
            Circle(CROQUIS10_R)
        with Locations((80000, 0)):
            Circle(CROQUIS10_R)
        with Locations((120000, 0)):
            Circle(CROQUIS10_R)
        with Locations((142622.48303651, 10652.325069026)):
            Circle(CROQUIS10_R)
        with Locations((172364.111003684, 7440.569648281)):
            Circle(CROQUIS10_R)
        with Locations((202271.970960191, 4213.666955799)):
            Circle(CROQUIS10_R)
        with Locations((190175.192827541, 42340.664723909)):
            Circle(CROQUIS10_R)
        with Locations((185900.002015253, 77404.913924723)):
            Circle(CROQUIS10_R)
    extrude(amount=SALIENTE_EXTRUIR9_DEPTH)

    # Croquis11 → Cortar-Extruir1 (cut)
    with BuildSketch(Plane.XY.offset(1700)):
        with Locations((-185902.963496918, 77444.135338977)):
            Circle(CROQUIS11_R)
    extrude(amount=-CORTAR_EXTRUIR1_DEPTH, mode=Mode.SUBTRACT)


solid = Compound([body_3.part, part_1.part])
